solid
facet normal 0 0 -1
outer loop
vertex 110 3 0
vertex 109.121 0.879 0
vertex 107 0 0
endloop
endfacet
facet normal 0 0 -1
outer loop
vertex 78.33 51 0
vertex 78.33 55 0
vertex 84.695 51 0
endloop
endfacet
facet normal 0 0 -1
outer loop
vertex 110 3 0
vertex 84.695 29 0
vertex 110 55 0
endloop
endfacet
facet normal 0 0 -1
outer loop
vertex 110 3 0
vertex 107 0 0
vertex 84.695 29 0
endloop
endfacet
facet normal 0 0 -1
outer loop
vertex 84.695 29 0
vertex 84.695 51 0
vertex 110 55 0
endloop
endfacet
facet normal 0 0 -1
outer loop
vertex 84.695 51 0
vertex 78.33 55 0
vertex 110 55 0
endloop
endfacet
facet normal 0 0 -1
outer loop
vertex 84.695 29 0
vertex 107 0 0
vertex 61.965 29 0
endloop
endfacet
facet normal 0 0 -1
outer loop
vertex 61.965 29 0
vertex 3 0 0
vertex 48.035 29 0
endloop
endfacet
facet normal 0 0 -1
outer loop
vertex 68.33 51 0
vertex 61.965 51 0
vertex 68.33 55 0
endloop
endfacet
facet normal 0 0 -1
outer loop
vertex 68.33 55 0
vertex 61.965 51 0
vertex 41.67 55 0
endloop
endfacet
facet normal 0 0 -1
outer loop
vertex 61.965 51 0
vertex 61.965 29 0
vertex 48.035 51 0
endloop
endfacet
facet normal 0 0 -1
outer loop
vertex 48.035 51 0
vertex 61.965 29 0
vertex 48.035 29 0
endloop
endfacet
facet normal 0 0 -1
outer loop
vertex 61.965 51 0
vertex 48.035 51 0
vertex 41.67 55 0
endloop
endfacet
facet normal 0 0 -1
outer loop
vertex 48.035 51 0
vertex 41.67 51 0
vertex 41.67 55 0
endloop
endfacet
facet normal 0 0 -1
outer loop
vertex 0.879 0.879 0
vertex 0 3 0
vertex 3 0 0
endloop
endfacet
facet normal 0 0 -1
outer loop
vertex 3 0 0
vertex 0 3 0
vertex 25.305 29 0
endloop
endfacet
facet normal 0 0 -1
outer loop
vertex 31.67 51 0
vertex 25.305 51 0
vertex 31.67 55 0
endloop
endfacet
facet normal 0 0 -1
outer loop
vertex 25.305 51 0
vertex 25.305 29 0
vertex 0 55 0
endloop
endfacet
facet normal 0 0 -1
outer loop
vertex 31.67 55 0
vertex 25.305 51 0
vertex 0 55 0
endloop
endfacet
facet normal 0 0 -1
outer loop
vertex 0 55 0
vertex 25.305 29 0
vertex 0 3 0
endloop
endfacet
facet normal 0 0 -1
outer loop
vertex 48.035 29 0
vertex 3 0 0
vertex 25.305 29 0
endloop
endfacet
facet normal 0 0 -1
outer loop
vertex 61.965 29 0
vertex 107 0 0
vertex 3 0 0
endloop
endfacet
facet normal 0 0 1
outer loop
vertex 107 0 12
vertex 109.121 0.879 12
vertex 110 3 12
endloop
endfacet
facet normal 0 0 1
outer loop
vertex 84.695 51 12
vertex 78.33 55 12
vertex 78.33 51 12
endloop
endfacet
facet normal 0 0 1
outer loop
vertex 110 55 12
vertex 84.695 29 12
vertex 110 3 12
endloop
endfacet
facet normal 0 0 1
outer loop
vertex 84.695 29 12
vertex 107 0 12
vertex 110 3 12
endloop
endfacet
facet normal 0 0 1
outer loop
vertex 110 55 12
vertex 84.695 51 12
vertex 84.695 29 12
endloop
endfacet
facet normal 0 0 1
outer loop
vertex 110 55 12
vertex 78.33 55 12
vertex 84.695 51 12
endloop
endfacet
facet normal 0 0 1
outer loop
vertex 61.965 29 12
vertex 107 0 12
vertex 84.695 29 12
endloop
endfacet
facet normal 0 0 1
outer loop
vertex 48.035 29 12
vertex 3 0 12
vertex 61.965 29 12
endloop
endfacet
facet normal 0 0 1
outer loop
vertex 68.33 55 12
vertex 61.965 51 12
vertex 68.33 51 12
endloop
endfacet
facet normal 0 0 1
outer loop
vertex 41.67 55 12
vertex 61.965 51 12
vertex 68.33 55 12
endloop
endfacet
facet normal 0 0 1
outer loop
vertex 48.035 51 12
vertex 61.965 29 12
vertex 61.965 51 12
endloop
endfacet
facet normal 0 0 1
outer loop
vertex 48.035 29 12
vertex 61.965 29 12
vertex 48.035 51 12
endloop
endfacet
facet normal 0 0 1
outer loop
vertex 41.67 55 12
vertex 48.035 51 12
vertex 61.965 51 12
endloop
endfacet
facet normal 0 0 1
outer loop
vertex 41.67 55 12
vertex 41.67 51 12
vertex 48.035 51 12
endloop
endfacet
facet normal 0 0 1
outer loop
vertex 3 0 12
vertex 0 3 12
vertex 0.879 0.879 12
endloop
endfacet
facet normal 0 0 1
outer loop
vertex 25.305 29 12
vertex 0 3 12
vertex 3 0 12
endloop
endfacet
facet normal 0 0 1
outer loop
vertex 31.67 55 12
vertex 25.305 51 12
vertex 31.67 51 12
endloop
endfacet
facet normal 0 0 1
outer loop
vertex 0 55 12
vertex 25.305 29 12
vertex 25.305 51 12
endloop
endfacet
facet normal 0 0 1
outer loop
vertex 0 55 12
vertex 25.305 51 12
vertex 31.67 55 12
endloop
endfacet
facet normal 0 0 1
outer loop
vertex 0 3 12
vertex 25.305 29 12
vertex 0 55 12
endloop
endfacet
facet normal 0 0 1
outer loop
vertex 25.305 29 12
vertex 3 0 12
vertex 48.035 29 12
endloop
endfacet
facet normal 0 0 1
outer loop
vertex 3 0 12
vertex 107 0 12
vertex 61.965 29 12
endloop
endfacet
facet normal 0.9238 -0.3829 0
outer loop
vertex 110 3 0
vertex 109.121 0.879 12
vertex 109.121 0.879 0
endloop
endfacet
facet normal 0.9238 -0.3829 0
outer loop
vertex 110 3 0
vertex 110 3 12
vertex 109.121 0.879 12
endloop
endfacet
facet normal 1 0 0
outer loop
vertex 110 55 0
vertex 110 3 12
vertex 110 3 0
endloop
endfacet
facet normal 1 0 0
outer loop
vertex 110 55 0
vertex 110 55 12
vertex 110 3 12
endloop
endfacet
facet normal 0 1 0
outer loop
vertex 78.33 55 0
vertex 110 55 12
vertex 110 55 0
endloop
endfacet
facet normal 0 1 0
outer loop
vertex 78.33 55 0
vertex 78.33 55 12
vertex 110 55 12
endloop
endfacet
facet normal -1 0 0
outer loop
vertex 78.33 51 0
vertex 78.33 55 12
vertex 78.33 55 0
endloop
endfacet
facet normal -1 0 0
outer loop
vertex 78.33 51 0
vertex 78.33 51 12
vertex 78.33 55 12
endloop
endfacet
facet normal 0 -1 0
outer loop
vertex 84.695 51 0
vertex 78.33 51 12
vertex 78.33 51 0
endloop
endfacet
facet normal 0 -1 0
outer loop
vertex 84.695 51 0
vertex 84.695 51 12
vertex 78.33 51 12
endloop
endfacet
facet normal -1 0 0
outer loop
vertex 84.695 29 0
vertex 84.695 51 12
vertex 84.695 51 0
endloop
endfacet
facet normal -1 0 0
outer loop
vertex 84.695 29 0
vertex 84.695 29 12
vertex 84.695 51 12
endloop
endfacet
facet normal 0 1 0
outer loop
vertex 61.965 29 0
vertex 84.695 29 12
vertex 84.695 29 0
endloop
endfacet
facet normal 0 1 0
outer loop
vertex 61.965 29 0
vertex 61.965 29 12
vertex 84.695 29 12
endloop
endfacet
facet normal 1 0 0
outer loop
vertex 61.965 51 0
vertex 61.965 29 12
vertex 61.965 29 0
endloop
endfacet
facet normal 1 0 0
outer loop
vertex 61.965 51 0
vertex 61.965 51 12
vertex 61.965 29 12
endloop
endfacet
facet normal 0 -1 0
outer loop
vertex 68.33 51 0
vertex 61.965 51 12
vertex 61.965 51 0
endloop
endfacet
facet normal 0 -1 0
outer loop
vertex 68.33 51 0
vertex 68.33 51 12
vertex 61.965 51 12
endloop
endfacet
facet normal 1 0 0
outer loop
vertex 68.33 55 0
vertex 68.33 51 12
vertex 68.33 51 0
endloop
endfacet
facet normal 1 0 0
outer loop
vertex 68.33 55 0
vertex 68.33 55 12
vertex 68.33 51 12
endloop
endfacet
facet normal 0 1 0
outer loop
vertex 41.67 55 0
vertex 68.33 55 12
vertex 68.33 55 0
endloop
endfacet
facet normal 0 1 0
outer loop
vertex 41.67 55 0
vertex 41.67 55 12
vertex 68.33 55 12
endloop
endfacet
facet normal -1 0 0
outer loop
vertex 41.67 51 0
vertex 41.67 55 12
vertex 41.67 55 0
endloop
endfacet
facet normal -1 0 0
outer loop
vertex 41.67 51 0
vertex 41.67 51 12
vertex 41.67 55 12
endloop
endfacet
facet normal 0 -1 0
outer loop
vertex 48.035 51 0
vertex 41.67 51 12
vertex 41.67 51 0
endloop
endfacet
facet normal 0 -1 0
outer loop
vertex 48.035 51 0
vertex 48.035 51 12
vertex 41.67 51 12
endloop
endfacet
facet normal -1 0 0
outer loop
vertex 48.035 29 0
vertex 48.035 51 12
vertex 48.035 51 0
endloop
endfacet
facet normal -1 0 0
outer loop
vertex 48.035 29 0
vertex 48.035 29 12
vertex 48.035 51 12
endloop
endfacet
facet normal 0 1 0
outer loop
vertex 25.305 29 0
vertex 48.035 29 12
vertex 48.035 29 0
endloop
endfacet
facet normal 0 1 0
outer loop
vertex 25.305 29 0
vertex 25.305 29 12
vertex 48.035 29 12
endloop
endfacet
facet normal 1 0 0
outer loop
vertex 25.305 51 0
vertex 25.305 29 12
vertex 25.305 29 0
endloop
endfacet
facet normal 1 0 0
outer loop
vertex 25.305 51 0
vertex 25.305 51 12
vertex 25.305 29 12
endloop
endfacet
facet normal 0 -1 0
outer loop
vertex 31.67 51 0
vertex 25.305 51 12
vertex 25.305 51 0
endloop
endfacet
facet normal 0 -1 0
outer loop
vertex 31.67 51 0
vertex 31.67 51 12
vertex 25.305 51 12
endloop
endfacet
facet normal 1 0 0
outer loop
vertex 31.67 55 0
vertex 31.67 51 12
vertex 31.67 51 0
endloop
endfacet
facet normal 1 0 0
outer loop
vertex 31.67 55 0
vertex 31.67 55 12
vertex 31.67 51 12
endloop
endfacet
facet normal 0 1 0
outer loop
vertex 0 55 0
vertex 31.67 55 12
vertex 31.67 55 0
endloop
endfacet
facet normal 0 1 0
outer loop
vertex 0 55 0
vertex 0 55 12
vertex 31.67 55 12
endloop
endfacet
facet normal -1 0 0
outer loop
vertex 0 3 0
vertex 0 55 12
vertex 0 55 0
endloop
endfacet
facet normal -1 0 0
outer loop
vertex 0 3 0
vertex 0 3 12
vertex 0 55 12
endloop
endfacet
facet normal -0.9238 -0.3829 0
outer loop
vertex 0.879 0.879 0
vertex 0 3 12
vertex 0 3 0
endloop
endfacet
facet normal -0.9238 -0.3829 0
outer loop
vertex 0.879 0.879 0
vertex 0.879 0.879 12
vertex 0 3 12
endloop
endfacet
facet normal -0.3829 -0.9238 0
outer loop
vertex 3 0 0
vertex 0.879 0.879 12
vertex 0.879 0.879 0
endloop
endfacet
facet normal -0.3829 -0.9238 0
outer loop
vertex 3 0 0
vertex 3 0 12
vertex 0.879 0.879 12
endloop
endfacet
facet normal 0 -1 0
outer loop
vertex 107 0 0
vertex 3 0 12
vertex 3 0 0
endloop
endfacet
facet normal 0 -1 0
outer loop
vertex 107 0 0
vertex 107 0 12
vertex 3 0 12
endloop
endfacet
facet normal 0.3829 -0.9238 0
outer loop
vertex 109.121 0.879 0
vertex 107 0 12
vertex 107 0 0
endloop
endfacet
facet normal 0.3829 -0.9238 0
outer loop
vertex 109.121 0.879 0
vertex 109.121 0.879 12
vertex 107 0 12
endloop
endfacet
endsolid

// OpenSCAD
$fn = 32;

// ----------------------------------------------------------------------
// Window plate: 110 x 55 mm, 2 open windows
// ----------------------------------------------------------------------

// --- parameters (mm) ---
profile_height = 12;      // extrusion height
profile_points = 24;      // points of the closed outline

profile = [[0, 3], [0.879, 0.879], [3, 0], [107, 0], [109.121, 0.879], [110, 3], [110, 55], [78.33, 55], [78.33, 51], [84.695, 51], [84.695, 29], [61.965, 29], [61.965, 51], [68.33, 51], [68.33, 55], [41.67, 55], [41.67, 51], [48.035, 51], [48.035, 29], [25.305, 29], [25.305, 51], [31.67, 51], [31.67, 55], [0, 55]];  // single closed polygon, 24 points, counter clockwise

// --- the one profile operation ---
linear_extrude(height = profile_height) polygon(points = profile);
